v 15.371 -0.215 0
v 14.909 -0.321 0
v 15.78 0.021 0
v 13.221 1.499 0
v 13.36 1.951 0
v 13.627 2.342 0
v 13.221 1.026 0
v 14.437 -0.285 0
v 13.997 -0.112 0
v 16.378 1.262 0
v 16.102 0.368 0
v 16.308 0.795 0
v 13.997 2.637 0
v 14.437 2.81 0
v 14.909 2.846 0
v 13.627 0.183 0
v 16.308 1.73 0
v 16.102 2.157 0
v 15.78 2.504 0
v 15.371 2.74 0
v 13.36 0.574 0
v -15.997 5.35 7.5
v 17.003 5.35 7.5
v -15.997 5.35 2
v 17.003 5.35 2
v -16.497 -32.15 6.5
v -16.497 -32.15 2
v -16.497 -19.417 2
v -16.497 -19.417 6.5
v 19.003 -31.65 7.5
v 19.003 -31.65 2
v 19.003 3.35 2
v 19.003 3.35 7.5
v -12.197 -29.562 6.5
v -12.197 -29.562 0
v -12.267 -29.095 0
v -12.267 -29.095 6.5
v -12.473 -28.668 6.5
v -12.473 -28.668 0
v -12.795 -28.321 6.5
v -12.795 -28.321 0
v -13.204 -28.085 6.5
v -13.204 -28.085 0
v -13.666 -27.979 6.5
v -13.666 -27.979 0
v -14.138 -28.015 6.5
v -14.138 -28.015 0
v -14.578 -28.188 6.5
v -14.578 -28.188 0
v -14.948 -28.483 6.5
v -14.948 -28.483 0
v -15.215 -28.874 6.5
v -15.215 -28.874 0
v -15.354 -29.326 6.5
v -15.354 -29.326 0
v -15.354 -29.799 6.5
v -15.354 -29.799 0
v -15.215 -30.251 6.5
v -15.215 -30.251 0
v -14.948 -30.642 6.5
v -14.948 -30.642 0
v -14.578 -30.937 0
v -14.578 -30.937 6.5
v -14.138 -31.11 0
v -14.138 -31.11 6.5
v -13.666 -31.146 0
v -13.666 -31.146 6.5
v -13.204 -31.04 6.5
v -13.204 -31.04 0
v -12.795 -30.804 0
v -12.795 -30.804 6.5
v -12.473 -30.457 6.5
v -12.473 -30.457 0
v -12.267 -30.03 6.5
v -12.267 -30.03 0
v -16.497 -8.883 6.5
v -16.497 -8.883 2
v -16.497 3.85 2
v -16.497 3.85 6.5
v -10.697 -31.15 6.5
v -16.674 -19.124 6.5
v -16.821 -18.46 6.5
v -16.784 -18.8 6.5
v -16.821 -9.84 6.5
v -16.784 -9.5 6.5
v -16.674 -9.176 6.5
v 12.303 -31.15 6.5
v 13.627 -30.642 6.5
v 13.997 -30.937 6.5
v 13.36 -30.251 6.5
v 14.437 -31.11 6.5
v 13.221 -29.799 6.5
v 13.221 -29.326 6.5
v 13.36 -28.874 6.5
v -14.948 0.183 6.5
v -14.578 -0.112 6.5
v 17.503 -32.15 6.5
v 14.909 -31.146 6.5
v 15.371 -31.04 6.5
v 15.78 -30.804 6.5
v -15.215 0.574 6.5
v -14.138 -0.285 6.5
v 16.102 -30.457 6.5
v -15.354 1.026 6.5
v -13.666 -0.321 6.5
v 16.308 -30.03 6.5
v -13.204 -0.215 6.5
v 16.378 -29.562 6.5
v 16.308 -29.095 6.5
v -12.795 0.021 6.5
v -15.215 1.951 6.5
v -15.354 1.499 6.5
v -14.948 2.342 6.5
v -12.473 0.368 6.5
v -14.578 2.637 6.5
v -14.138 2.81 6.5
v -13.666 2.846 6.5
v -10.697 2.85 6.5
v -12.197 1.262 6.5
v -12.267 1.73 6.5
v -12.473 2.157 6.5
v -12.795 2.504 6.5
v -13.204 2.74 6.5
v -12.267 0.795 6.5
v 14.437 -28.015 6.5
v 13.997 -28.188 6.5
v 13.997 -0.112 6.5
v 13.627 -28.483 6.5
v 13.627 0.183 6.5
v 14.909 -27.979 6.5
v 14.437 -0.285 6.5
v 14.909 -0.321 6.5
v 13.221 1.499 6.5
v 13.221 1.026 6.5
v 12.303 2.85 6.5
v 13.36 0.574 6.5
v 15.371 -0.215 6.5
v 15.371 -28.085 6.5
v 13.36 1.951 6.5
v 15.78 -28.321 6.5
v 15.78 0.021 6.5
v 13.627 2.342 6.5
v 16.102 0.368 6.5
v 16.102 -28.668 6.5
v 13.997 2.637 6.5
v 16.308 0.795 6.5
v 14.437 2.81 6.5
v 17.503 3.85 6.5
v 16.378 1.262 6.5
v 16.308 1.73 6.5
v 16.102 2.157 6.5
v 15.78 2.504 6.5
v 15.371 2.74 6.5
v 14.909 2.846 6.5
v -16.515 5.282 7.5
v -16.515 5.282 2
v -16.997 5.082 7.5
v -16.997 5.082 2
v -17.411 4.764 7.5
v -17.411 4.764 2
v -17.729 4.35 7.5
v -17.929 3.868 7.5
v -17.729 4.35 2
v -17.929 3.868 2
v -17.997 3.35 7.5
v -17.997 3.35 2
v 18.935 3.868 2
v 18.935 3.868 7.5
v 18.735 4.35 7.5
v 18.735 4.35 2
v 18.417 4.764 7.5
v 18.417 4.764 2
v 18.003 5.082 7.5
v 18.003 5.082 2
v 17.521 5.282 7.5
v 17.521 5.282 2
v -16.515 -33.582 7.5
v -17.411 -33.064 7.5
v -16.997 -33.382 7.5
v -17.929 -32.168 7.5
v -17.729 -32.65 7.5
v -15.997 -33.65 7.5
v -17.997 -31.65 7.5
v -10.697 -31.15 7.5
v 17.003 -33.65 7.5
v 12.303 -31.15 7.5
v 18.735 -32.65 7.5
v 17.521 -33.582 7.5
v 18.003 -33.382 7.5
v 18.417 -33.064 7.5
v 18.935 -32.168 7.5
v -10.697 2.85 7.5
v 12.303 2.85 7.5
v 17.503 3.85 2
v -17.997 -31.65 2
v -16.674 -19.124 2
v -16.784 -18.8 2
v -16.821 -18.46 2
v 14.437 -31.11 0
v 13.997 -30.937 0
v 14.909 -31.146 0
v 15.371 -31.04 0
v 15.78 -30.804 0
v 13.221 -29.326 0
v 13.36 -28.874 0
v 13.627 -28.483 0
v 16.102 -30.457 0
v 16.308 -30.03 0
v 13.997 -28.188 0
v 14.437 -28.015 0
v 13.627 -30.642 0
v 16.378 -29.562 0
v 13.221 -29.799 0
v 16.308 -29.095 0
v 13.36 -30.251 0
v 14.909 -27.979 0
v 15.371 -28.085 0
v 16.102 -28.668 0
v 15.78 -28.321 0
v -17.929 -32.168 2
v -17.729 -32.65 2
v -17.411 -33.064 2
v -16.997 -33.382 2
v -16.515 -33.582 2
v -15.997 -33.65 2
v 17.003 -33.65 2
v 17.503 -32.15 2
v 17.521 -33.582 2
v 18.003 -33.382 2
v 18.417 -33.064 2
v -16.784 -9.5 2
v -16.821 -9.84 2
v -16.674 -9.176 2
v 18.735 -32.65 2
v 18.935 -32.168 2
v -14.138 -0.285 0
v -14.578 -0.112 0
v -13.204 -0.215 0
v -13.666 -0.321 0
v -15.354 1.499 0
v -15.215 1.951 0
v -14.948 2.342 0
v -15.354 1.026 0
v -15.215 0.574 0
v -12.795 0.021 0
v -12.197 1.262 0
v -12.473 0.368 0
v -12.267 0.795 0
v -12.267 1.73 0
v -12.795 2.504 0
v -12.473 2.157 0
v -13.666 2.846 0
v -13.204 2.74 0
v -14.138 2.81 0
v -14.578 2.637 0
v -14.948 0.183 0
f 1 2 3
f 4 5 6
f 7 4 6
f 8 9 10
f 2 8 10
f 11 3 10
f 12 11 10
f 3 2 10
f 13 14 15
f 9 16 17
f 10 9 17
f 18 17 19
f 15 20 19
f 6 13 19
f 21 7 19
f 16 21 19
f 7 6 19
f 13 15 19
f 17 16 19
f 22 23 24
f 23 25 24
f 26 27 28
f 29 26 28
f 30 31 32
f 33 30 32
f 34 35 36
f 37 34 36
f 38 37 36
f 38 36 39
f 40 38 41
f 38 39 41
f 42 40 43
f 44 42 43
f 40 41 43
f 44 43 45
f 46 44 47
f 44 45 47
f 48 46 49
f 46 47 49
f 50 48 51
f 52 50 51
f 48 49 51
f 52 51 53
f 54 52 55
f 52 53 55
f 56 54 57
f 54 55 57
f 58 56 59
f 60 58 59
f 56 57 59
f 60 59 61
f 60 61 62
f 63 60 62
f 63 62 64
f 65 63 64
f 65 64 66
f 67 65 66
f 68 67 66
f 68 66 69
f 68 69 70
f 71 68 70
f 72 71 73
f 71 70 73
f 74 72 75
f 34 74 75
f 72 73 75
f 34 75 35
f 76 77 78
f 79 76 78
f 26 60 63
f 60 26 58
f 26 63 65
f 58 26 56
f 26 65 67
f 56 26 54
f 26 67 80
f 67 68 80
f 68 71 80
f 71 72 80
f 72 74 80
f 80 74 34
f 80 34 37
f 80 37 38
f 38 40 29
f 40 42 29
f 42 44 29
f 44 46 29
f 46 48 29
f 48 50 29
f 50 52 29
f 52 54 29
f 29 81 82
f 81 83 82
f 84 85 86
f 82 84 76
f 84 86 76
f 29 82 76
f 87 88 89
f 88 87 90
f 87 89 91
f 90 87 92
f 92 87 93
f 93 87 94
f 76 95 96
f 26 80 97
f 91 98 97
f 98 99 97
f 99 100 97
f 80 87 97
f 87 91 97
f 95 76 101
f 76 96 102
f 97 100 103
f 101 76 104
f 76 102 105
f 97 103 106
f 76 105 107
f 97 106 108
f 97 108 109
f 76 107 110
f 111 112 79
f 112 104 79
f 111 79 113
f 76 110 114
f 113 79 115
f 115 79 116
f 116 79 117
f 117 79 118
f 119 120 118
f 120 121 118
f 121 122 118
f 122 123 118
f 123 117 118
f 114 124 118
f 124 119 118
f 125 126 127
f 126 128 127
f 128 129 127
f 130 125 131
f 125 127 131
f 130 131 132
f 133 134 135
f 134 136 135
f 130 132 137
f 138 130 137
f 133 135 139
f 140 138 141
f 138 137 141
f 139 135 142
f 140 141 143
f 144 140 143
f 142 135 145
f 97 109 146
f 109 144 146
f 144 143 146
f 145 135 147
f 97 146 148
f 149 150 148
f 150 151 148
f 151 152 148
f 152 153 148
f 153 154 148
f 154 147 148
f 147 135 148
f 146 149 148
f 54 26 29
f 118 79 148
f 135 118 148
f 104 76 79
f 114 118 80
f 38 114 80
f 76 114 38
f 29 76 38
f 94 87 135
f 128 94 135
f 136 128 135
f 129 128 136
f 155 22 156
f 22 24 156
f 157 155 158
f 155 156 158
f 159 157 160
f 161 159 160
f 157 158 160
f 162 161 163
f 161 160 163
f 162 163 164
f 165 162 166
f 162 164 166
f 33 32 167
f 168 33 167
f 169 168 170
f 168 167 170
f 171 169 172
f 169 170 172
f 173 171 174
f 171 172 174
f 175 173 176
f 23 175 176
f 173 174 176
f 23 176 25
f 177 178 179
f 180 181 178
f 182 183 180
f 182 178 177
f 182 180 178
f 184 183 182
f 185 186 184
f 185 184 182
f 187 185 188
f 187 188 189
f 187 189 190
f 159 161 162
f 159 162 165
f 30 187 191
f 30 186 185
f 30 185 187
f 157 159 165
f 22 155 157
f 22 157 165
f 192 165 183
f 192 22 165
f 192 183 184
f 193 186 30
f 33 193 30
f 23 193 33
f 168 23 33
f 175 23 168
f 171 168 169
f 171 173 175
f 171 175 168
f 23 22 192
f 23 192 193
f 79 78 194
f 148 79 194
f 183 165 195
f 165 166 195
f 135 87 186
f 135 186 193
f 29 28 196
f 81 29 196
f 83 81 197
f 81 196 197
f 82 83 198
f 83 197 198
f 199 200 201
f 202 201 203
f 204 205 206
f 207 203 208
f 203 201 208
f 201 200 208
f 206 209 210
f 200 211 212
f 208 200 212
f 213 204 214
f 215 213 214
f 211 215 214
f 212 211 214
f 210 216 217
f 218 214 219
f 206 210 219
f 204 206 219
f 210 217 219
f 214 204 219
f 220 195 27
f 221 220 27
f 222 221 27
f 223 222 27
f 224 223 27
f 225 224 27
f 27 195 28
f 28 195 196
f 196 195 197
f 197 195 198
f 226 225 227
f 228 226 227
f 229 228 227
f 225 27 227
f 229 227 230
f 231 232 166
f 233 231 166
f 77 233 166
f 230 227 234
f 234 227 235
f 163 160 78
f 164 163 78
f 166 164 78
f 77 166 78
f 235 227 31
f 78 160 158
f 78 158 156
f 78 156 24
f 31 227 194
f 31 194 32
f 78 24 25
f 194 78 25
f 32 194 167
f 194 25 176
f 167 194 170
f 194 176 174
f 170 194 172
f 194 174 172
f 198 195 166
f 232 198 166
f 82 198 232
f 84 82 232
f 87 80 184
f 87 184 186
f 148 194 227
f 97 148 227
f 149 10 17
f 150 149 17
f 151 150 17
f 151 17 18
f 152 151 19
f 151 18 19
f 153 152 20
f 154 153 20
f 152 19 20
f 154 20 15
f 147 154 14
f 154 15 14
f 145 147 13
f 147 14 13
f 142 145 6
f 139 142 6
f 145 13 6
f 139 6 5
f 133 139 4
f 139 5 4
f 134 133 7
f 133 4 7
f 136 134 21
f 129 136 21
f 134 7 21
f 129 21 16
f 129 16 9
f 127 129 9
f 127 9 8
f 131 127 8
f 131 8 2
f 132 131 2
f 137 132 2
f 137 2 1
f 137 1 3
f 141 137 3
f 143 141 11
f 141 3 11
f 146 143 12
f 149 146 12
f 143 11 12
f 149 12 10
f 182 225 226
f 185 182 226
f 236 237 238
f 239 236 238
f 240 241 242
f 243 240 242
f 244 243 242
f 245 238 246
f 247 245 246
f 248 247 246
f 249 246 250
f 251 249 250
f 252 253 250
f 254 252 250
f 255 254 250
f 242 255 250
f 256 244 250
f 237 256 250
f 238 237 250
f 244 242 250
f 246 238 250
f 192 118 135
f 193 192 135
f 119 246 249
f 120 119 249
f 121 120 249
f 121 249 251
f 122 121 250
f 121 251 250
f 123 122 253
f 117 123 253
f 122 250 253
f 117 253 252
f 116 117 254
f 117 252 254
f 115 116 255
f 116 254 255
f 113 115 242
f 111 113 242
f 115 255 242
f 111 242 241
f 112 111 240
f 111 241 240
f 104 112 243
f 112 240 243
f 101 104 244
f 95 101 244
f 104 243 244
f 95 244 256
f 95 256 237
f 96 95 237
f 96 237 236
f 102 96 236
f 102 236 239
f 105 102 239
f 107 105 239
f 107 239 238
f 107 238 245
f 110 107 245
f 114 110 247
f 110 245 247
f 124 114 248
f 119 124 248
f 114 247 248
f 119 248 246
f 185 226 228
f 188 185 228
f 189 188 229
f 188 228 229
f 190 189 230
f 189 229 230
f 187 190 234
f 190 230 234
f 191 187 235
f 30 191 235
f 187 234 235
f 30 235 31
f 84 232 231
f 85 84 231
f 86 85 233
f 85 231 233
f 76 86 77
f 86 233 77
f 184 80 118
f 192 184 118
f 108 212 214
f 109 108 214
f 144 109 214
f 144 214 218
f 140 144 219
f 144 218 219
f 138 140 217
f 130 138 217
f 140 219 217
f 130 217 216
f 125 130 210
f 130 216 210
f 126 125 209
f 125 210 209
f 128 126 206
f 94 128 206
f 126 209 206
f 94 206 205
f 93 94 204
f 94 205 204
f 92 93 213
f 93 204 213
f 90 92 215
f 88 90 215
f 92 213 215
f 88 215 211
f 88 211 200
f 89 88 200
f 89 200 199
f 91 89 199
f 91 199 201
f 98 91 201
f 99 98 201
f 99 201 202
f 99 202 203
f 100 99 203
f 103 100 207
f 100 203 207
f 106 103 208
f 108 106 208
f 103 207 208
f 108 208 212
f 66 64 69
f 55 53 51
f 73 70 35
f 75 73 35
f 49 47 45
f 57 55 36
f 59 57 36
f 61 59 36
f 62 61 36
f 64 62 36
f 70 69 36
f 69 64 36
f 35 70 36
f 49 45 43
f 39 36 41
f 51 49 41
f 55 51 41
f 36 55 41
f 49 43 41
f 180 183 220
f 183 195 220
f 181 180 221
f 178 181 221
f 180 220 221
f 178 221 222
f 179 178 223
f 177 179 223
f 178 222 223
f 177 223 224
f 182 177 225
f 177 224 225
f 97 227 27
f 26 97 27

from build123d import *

# Parameters (mm, degrees)
CROQUIS1_R                = 1.5875
SALIENTE_EXTRUIR1_DEPTH   = 6.5
SALIENTE_EXTRUIR1_2_DEPTH = 6.5
SALIENTE_EXTRUIR1_3_DEPTH = 6.5
SALIENTE_EXTRUIR1_4_DEPTH = 6.5
SALIENTE_EXTRUIR2_DEPTH   = 4.5
CROQUIS3_W                = 23
CROQUIS3_H                = 34
SALIENTE_EXTRUIR3_DEPTH   = 1


with BuildPart() as part:
    # Croquis1 → Saliente-Extruir1 (new body)
    with BuildSketch(Plane.XY):
        with Locations((14.790535489, 1.2625)):
            Circle(CROQUIS1_R)
    extrude(amount=SALIENTE_EXTRUIR1_DEPTH)



with BuildPart() as body_2:
    # Croquis1 → Saliente-Extruir1 2 (new body)
    with BuildSketch(Plane.XY):
        with Locations((14.790535489, -29.5625)):
            Circle(CROQUIS1_R)
    extrude(amount=SALIENTE_EXTRUIR1_2_DEPTH)


with BuildPart() as body_3:
    # Croquis1 → Saliente-Extruir1 3 (new body)
    with BuildSketch(Plane.XY):
        with Locations((-13.784464511, -29.5625)):
            Circle(CROQUIS1_R)
    extrude(amount=SALIENTE_EXTRUIR1_3_DEPTH)


with BuildPart() as body_4:
    # Croquis1 → Saliente-Extruir1 4 (new body)
    with BuildSketch(Plane.XY):
        with Locations((-13.784464511, 1.2625)):
            Circle(CROQUIS1_R)
    extrude(amount=SALIENTE_EXTRUIR1_4_DEPTH)


with BuildPart() as body_5:
    # Croquis2 → Saliente-Extruir2 (new body)
    with BuildSketch(Plane.XY.offset(2)):
        with BuildLine():
            ThreePointArc((-15.996964511, 5.35), (-17.411178073, 4.764213562), (-17.996964511, 3.35))
            Line((-17.996964511, 3.35), (-17.996964511, -31.65))
            ThreePointArc((-17.996964511, -31.65), (-17.411178073, -33.064213562), (-15.996964511, -33.65))
            Line((-15.996964511, -33.65), (17.003035489, -33.65))
            ThreePointArc((17.003035489, -33.65), (18.417249051, -33.064213562), (19.003035489, -31.65))
            Line((19.003035489, -31.65), (19.003035489, 3.35))
            ThreePointArc((19.003035489, 3.35), (18.417249051, 4.764213562), (17.003035489, 5.35))
            Line((17.003035489, 5.35), (-15.996964511, 5.35))
        make_face()
        with BuildLine():
            Line((-16.496964511, -8.883114021), (-16.496964511, 3.85))
            Line((-16.496964511, 3.85), (17.503035489, 3.85))
            Line((17.503035489, 3.85), (17.503035489, -32.15))
            Line((17.503035489, -32.15), (-16.496964511, -32.15))
            Line((-16.496964511, -32.15), (-16.496964511, -19.416885979))
            ThreePointArc((-16.496964511, -19.416885979), (-16.73791903, -18.965158785), (-16.821172495, -18.46))
            Line((-16.821172495, -18.46), (-16.821172495, -9.84))
            ThreePointArc((-16.821172495, -9.84), (-16.73791903, -9.334841215), (-16.496964511, -8.883114021))
        make_face(mode=Mode.SUBTRACT)
    extrude(amount=SALIENTE_EXTRUIR2_DEPTH)


with BuildPart() as part_1:
    add(part.part)

    add(body_2.part)  # Saliente-Extruir3 merges body 2

    add(body_3.part)  # Saliente-Extruir3 merges body 3

    add(body_4.part)  # Saliente-Extruir3 merges body 4

    add(body_5.part)  # Saliente-Extruir3 merges body 5
    # Croquis3 → Saliente-Extruir3 (add)
    with BuildSketch(Plane.XY.offset(6.5)):
        with BuildLine():
            ThreePointArc((19.003035489, 3.35), (18.417249051, 4.764213562), (17.003035489, 5.35))
            Line((17.003035489, 5.35), (-15.996964511, 5.35))
            ThreePointArc((-15.996964511, 5.35), (-17.411178073, 4.764213562), (-17.996964511, 3.35))
            Line((-17.996964511, 3.35), (-17.996964511, -31.65))
            ThreePointArc((-17.996964511, -31.65), (-17.411178073, -33.064213562), (-15.996964511, -33.65))
            Line((-15.996964511, -33.65), (17.003035489, -33.65))
            ThreePointArc((17.003035489, -33.65), (18.417249051, -33.064213562), (19.003035489, -31.65))
            Line((19.003035489, -31.65), (19.003035489, 3.35))
        make_face()
        with BuildLine():
            ThreePointArc((-16.821172495, -9.84), (-16.73791903, -9.334841215), (-16.496964511, -8.883114021))
            Line((-16.496964511, -8.883114021), (-16.496964511, 3.85))
            Line((-16.496964511, 3.85), (17.503035489, 3.85))
            Line((17.503035489, 3.85), (17.503035489, -32.15))
            Line((17.503035489, -32.15), (-16.496964511, -32.15))
            Line((-16.496964511, -32.15), (-16.496964511, -19.416885979))
            ThreePointArc((-16.496964511, -19.416885979), (-16.73791903, -18.965158785), (-16.821172495, -18.46))
            Line((-16.821172495, -18.46), (-16.821172495, -9.84))
        make_face(mode=Mode.SUBTRACT)
        with BuildLine():
            Line((-16.496964511, -8.883114021), (-16.496964511, 3.85))
            Line((-16.496964511, 3.85), (17.503035489, 3.85))
            Line((17.503035489, 3.85), (17.503035489, -32.15))
            Line((17.503035489, -32.15), (-16.496964511, -32.15))
            Line((-16.496964511, -32.15), (-16.496964511, -19.416885979))
            ThreePointArc((-16.496964511, -19.416885979), (-16.73791903, -18.965158785), (-16.821172495, -18.46))
            Line((-16.821172495, -18.46), (-16.821172495, -9.84))
            ThreePointArc((-16.821172495, -9.84), (-16.73791903, -9.334841215), (-16.496964511, -8.883114021))
        make_face()
        with Locations((0.803035489, -14.15)):
            Rectangle(CROQUIS3_W, CROQUIS3_H, mode=Mode.SUBTRACT)
    extrude(amount=SALIENTE_EXTRUIR3_DEPTH)


solid = part_1.part
